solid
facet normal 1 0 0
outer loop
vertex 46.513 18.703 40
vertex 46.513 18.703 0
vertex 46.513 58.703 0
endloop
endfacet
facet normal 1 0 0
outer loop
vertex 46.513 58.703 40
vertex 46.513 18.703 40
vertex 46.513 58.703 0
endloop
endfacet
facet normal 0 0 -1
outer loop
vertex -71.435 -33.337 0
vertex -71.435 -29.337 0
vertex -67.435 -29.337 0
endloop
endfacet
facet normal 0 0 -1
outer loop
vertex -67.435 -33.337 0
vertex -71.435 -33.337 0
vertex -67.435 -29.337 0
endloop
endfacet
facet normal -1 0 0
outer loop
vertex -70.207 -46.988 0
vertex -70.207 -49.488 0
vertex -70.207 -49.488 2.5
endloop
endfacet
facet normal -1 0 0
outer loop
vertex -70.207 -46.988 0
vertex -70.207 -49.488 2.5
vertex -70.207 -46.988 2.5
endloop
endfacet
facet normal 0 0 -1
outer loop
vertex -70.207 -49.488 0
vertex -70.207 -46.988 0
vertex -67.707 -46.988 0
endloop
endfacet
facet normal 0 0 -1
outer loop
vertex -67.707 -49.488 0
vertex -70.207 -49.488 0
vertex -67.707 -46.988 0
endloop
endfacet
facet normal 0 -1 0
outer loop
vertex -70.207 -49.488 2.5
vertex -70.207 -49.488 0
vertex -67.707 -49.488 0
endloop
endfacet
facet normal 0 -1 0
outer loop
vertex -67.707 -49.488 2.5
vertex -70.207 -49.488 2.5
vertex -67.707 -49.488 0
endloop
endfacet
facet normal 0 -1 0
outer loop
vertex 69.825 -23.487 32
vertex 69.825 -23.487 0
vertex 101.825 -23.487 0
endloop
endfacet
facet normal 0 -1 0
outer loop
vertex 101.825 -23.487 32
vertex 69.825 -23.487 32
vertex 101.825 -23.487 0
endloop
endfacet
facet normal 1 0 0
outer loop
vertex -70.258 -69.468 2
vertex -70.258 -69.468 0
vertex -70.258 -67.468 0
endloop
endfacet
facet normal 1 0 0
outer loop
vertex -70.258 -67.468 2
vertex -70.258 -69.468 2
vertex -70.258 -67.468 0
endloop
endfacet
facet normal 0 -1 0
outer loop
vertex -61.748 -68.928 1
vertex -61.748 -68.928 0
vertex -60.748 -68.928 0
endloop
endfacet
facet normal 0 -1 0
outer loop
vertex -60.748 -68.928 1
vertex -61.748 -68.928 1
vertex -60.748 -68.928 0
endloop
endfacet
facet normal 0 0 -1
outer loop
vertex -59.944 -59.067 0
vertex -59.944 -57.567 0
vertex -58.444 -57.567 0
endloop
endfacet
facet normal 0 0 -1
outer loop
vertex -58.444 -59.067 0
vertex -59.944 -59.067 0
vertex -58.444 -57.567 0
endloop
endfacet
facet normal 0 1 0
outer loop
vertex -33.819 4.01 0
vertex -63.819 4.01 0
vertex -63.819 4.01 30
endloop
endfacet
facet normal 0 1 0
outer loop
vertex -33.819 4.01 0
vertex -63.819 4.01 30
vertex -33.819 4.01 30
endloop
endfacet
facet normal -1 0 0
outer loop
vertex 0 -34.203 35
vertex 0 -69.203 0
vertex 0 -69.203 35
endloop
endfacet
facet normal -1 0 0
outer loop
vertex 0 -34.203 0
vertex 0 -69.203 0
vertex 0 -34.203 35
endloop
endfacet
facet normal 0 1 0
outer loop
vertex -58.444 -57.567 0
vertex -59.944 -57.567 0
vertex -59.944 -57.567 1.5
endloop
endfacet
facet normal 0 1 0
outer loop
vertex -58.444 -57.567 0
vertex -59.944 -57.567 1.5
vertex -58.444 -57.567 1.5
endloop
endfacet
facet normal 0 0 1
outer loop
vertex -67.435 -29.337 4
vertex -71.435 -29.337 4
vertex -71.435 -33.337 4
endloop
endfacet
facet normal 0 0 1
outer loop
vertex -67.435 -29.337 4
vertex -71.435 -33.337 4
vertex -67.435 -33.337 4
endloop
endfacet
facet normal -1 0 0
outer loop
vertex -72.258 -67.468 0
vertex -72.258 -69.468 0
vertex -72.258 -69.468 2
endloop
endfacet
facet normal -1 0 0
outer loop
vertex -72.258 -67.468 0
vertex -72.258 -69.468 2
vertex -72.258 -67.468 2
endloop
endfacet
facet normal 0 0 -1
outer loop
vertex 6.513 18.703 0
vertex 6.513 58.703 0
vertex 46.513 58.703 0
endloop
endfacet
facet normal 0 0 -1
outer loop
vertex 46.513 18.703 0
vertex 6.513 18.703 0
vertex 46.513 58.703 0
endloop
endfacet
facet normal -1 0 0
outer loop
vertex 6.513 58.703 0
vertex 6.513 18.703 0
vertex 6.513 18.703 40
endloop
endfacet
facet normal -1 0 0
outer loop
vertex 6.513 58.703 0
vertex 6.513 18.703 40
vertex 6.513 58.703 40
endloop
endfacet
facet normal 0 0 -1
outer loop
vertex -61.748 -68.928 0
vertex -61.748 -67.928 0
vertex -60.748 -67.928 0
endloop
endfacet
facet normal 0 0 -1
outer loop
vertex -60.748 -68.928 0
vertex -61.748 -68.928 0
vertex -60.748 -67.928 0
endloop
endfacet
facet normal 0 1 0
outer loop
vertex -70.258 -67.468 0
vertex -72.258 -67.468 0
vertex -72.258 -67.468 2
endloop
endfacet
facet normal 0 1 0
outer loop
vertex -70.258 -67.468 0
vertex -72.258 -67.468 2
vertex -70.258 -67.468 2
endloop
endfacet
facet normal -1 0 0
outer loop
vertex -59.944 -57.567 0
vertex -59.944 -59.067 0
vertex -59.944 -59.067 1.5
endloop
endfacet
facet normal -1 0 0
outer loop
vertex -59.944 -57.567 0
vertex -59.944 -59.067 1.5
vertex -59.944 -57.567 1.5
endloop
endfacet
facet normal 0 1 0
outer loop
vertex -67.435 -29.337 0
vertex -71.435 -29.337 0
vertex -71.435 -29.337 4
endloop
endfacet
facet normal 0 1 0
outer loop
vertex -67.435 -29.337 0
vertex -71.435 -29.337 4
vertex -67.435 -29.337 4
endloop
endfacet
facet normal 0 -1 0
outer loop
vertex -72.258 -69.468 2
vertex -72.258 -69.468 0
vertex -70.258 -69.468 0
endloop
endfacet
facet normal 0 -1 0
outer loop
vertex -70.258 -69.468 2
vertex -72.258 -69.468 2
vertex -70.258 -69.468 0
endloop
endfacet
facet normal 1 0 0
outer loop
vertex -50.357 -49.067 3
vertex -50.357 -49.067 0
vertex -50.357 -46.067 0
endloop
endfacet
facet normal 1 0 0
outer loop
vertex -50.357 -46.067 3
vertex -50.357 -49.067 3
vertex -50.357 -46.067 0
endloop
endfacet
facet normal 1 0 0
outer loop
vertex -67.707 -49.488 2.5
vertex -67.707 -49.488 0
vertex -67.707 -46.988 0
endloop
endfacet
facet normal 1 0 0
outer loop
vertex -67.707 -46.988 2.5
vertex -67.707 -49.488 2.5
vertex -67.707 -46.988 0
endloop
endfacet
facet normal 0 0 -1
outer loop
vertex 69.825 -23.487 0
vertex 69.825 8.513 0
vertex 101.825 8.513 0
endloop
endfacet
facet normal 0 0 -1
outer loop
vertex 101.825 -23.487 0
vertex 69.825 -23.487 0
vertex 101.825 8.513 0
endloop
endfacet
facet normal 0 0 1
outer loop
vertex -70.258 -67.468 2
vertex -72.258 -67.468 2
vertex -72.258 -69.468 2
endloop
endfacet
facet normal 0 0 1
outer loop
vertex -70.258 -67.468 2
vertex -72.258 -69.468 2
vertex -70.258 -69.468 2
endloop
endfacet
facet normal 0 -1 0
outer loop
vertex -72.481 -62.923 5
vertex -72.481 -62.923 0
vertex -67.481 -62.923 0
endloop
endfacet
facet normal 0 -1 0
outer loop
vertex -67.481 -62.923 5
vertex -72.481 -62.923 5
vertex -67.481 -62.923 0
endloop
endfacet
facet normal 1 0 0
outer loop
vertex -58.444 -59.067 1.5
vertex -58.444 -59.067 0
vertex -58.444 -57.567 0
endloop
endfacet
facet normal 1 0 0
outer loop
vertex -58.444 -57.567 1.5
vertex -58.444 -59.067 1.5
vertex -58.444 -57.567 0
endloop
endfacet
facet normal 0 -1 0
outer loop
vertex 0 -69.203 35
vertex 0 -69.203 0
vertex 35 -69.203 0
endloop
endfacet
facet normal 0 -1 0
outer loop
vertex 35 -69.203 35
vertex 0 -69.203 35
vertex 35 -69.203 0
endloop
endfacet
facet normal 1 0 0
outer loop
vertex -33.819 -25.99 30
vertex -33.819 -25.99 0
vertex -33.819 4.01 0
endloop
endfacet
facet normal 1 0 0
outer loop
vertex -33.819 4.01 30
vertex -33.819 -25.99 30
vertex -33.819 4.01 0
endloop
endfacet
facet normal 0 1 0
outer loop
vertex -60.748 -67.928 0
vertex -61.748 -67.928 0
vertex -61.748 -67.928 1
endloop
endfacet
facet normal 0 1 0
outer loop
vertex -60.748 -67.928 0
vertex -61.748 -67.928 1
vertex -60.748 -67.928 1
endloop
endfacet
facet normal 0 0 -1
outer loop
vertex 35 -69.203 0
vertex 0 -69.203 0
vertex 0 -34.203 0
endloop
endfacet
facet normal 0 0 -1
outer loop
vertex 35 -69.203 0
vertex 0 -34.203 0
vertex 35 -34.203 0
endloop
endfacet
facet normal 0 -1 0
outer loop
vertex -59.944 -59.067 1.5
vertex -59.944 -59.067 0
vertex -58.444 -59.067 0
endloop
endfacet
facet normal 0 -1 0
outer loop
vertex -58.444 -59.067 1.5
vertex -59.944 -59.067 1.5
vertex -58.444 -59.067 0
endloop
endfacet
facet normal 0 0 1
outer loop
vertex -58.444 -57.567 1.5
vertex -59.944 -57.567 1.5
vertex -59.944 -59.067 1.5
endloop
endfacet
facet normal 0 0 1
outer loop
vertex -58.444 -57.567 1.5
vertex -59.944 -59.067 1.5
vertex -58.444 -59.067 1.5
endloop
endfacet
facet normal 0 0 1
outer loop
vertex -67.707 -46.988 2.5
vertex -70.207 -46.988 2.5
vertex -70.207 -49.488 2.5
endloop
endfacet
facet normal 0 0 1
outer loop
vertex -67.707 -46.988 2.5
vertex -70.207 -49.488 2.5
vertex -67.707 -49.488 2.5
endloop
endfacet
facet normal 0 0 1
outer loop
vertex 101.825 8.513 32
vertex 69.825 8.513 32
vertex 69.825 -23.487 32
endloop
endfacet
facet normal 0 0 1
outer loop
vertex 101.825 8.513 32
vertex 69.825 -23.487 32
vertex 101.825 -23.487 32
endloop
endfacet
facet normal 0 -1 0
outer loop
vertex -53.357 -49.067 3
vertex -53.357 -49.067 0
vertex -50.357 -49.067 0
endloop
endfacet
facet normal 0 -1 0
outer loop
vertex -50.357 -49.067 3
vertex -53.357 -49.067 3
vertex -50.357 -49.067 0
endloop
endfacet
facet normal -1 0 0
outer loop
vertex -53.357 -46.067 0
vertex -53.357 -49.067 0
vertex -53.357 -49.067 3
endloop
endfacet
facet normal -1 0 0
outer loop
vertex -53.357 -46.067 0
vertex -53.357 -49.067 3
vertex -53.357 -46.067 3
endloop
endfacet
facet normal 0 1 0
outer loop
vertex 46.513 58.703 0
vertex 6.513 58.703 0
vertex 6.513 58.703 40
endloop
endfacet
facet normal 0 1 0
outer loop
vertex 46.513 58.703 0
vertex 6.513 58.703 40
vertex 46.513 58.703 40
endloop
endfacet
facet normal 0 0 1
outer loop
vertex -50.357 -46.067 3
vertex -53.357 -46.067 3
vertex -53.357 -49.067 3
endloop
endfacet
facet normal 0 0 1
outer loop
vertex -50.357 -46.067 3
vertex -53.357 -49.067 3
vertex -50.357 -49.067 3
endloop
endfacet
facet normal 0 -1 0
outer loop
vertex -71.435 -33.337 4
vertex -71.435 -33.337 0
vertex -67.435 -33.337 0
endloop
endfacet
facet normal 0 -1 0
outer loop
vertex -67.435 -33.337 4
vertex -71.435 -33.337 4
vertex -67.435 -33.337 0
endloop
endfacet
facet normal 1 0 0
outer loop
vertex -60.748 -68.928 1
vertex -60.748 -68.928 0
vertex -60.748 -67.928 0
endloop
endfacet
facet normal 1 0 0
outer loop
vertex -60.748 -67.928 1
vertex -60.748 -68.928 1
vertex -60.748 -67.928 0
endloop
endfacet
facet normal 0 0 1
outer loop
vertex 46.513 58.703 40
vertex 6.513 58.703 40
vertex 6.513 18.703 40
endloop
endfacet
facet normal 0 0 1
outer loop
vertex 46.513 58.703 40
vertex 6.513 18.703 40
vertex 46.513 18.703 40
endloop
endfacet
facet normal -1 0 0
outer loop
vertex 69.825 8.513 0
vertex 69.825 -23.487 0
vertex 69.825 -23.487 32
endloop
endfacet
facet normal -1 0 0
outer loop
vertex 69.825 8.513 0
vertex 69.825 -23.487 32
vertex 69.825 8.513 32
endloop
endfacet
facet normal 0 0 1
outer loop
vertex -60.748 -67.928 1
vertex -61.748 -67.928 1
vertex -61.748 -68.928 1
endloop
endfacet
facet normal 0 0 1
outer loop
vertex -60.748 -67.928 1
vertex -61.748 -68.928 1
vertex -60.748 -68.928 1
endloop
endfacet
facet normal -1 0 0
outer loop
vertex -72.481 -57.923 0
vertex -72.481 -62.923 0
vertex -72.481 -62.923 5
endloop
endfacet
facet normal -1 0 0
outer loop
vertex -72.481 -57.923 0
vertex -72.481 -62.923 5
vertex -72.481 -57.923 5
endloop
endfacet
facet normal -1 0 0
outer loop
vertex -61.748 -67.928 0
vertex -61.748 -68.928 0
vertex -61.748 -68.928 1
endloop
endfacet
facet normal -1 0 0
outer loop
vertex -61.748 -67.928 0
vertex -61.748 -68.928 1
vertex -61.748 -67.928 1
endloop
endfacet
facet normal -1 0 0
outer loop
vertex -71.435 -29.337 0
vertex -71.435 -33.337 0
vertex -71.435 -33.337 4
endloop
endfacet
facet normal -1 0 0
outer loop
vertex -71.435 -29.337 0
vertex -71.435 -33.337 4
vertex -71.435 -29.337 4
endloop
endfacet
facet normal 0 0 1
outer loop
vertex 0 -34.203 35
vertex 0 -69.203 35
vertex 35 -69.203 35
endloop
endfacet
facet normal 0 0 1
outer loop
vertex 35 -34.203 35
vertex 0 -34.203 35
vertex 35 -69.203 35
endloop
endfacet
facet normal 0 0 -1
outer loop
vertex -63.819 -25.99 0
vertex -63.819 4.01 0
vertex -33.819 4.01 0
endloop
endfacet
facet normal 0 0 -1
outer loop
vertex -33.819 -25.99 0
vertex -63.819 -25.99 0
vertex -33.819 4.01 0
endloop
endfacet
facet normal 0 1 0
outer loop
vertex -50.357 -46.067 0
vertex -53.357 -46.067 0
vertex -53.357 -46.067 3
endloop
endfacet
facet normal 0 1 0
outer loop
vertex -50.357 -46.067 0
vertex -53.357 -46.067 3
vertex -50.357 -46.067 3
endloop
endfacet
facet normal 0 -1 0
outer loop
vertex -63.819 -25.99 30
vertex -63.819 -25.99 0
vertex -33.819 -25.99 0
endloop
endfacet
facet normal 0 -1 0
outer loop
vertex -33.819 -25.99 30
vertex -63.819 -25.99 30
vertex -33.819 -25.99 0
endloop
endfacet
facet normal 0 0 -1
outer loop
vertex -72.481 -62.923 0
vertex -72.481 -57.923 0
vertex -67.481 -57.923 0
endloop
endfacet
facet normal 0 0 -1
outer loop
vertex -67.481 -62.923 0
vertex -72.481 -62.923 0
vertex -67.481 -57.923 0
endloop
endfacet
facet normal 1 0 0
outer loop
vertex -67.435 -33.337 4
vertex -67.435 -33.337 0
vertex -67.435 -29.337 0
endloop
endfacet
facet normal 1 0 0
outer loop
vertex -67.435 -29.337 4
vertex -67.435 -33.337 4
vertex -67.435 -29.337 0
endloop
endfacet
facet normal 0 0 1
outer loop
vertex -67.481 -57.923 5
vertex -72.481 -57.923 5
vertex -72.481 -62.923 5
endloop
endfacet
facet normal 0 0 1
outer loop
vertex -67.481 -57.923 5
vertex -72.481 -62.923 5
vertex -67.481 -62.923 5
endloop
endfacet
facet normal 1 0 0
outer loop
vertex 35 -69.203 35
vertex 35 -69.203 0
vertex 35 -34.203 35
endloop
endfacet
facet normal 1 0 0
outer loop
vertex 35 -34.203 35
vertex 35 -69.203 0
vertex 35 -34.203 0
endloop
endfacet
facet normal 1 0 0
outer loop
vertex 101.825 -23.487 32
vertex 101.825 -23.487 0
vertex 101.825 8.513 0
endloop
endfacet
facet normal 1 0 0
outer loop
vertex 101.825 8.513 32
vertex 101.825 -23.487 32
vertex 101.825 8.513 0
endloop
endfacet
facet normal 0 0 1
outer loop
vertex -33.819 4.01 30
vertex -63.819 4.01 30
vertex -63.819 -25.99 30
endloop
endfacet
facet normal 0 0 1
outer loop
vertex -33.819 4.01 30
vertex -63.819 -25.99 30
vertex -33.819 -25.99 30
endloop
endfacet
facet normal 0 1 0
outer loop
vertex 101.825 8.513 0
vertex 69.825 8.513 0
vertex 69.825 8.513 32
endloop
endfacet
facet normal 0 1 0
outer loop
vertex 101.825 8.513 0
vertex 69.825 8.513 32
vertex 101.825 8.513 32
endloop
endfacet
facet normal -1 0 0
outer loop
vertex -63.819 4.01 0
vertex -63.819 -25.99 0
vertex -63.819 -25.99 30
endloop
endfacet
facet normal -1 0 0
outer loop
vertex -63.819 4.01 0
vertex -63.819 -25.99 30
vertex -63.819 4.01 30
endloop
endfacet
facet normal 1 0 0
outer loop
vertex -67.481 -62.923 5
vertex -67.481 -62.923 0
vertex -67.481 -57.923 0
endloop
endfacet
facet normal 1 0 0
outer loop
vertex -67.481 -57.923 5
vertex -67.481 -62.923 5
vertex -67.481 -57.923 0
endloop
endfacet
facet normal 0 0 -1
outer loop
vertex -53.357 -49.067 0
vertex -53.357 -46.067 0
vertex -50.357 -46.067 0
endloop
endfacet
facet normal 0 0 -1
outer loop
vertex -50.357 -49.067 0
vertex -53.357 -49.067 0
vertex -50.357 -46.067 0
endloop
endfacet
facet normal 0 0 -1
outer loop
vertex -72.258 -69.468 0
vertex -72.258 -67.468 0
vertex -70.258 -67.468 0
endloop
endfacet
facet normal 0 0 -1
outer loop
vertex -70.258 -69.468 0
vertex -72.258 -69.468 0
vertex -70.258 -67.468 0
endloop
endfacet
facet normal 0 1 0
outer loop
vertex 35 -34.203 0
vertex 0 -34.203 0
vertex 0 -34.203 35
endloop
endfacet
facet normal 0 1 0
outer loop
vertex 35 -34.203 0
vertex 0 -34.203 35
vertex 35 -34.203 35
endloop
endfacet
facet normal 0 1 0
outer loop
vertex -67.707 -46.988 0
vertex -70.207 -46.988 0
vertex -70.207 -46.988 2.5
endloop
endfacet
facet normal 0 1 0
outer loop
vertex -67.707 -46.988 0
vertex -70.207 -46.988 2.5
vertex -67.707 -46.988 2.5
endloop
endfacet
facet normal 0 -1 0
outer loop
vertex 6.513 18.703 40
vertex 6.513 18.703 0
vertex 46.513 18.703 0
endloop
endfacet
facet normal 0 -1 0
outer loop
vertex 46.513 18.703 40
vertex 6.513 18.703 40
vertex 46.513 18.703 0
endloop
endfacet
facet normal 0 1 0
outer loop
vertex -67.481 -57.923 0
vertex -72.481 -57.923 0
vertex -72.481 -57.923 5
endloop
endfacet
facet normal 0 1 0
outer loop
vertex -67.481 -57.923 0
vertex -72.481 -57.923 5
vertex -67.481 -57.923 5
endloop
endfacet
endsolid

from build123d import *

# Parameters (mm, degrees)
F0_W      = 2
F0_H      = 2
F2_DEPTH  = 2
F1_W      = 5
F1_H      = 5
F3_DEPTH  = 5
F6_W      = 2.5
F6_H      = 2.5
F9_DEPTH  = 2.5
F8_W      = 4
F8_H      = 4
F10_DEPTH = 4
F7_W      = 3
F7_H      = 3
F11_DEPTH = 3
F5_W      = 1.5
F5_H      = 1.5
F12_DEPTH = 1.5
F4_W      = 1
F4_H      = 1
F13_DEPTH = 1
F14_W     = 30
F14_H     = 30
F15_DEPTH = 30
F16_W     = 40
F16_H     = 40
F17_DEPTH = 40
F18_W     = 35
F18_H     = 35
F19_DEPTH = 35
F20_W     = 32
F20_H     = 32
F21_DEPTH = 32


with BuildPart() as f2:
    # F0 (on Top) → F2 (new body)
    with BuildSketch(Plane.XY):
        with Locations((-71.25775, -68.46791)):
            Rectangle(F0_W, F0_H)
    extrude(amount=F2_DEPTH)


with BuildPart() as f3:
    # F1 (on Top) → F3 (new body)
    with BuildSketch(Plane.XY):
        with Locations((-69.980761, -60.423461)):
            Rectangle(F1_W, F1_H)
    extrude(amount=F3_DEPTH)


with BuildPart() as f9:
    # F6 (on Top) → F9 (new body)
    with BuildSketch(Plane.XY):
        with Locations((-68.957002, -48.23774)):
            Rectangle(F6_W, F6_H)
    extrude(amount=F9_DEPTH)


with BuildPart() as f10:
    # F8 (on Top) → F10 (new body)
    with BuildSketch(Plane.XY):
        with Locations((-69.435324, -31.337213)):
            Rectangle(F8_W, F8_H)
    extrude(amount=F10_DEPTH)


with BuildPart() as f11:
    # F7 (on Top) → F11 (new body)
    with BuildSketch(Plane.XY):
        with Locations((-51.856958, -47.566883)):
            Rectangle(F7_W, F7_H)
    extrude(amount=F11_DEPTH)


with BuildPart() as f12:
    # F5 (on Top) → F12 (new body)
    with BuildSketch(Plane.XY):
        with Locations((-59.194355, -58.317369)):
            Rectangle(F5_W, F5_H)
    extrude(amount=F12_DEPTH)


with BuildPart() as f13:
    # F4 (on Top) → F13 (new body)
    with BuildSketch(Plane.XY):
        with Locations((-61.248402, -68.427556)):
            Rectangle(F4_W, F4_H)
    extrude(amount=F13_DEPTH)


with BuildPart() as f15:
    # F14 (on Top) → F15 (new body)
    with BuildSketch(Plane.XY):
        with Locations((-48.818811, -10.989797)):
            Rectangle(F14_W, F14_H)
    extrude(amount=F15_DEPTH)


with BuildPart() as f17:
    # F16 (on Top) → F17 (new body)
    with BuildSketch(Plane.XY):
        with Locations((26.51285, 38.70328)):
            Rectangle(F16_W, F16_H)
    extrude(amount=F17_DEPTH)


with BuildPart() as f19:
    # F18 (on Top) → F19 (new body)
    with BuildSketch(Plane.XY):
        with Locations((17.5, -51.70328)):
            Rectangle(F18_W, F18_H)
    extrude(amount=F19_DEPTH)


with BuildPart() as f21:
    # F20 (on Top) → F21 (new body)
    with BuildSketch(Plane.XY):
        with Locations((85.824582, -7.487307)):
            Rectangle(F20_W, F20_H)
    extrude(amount=F21_DEPTH)


solid = Compound([f2.part, f3.part, f9.part, f10.part, f11.part, f12.part, f13.part, f15.part, f17.part, f19.part, f21.part])
